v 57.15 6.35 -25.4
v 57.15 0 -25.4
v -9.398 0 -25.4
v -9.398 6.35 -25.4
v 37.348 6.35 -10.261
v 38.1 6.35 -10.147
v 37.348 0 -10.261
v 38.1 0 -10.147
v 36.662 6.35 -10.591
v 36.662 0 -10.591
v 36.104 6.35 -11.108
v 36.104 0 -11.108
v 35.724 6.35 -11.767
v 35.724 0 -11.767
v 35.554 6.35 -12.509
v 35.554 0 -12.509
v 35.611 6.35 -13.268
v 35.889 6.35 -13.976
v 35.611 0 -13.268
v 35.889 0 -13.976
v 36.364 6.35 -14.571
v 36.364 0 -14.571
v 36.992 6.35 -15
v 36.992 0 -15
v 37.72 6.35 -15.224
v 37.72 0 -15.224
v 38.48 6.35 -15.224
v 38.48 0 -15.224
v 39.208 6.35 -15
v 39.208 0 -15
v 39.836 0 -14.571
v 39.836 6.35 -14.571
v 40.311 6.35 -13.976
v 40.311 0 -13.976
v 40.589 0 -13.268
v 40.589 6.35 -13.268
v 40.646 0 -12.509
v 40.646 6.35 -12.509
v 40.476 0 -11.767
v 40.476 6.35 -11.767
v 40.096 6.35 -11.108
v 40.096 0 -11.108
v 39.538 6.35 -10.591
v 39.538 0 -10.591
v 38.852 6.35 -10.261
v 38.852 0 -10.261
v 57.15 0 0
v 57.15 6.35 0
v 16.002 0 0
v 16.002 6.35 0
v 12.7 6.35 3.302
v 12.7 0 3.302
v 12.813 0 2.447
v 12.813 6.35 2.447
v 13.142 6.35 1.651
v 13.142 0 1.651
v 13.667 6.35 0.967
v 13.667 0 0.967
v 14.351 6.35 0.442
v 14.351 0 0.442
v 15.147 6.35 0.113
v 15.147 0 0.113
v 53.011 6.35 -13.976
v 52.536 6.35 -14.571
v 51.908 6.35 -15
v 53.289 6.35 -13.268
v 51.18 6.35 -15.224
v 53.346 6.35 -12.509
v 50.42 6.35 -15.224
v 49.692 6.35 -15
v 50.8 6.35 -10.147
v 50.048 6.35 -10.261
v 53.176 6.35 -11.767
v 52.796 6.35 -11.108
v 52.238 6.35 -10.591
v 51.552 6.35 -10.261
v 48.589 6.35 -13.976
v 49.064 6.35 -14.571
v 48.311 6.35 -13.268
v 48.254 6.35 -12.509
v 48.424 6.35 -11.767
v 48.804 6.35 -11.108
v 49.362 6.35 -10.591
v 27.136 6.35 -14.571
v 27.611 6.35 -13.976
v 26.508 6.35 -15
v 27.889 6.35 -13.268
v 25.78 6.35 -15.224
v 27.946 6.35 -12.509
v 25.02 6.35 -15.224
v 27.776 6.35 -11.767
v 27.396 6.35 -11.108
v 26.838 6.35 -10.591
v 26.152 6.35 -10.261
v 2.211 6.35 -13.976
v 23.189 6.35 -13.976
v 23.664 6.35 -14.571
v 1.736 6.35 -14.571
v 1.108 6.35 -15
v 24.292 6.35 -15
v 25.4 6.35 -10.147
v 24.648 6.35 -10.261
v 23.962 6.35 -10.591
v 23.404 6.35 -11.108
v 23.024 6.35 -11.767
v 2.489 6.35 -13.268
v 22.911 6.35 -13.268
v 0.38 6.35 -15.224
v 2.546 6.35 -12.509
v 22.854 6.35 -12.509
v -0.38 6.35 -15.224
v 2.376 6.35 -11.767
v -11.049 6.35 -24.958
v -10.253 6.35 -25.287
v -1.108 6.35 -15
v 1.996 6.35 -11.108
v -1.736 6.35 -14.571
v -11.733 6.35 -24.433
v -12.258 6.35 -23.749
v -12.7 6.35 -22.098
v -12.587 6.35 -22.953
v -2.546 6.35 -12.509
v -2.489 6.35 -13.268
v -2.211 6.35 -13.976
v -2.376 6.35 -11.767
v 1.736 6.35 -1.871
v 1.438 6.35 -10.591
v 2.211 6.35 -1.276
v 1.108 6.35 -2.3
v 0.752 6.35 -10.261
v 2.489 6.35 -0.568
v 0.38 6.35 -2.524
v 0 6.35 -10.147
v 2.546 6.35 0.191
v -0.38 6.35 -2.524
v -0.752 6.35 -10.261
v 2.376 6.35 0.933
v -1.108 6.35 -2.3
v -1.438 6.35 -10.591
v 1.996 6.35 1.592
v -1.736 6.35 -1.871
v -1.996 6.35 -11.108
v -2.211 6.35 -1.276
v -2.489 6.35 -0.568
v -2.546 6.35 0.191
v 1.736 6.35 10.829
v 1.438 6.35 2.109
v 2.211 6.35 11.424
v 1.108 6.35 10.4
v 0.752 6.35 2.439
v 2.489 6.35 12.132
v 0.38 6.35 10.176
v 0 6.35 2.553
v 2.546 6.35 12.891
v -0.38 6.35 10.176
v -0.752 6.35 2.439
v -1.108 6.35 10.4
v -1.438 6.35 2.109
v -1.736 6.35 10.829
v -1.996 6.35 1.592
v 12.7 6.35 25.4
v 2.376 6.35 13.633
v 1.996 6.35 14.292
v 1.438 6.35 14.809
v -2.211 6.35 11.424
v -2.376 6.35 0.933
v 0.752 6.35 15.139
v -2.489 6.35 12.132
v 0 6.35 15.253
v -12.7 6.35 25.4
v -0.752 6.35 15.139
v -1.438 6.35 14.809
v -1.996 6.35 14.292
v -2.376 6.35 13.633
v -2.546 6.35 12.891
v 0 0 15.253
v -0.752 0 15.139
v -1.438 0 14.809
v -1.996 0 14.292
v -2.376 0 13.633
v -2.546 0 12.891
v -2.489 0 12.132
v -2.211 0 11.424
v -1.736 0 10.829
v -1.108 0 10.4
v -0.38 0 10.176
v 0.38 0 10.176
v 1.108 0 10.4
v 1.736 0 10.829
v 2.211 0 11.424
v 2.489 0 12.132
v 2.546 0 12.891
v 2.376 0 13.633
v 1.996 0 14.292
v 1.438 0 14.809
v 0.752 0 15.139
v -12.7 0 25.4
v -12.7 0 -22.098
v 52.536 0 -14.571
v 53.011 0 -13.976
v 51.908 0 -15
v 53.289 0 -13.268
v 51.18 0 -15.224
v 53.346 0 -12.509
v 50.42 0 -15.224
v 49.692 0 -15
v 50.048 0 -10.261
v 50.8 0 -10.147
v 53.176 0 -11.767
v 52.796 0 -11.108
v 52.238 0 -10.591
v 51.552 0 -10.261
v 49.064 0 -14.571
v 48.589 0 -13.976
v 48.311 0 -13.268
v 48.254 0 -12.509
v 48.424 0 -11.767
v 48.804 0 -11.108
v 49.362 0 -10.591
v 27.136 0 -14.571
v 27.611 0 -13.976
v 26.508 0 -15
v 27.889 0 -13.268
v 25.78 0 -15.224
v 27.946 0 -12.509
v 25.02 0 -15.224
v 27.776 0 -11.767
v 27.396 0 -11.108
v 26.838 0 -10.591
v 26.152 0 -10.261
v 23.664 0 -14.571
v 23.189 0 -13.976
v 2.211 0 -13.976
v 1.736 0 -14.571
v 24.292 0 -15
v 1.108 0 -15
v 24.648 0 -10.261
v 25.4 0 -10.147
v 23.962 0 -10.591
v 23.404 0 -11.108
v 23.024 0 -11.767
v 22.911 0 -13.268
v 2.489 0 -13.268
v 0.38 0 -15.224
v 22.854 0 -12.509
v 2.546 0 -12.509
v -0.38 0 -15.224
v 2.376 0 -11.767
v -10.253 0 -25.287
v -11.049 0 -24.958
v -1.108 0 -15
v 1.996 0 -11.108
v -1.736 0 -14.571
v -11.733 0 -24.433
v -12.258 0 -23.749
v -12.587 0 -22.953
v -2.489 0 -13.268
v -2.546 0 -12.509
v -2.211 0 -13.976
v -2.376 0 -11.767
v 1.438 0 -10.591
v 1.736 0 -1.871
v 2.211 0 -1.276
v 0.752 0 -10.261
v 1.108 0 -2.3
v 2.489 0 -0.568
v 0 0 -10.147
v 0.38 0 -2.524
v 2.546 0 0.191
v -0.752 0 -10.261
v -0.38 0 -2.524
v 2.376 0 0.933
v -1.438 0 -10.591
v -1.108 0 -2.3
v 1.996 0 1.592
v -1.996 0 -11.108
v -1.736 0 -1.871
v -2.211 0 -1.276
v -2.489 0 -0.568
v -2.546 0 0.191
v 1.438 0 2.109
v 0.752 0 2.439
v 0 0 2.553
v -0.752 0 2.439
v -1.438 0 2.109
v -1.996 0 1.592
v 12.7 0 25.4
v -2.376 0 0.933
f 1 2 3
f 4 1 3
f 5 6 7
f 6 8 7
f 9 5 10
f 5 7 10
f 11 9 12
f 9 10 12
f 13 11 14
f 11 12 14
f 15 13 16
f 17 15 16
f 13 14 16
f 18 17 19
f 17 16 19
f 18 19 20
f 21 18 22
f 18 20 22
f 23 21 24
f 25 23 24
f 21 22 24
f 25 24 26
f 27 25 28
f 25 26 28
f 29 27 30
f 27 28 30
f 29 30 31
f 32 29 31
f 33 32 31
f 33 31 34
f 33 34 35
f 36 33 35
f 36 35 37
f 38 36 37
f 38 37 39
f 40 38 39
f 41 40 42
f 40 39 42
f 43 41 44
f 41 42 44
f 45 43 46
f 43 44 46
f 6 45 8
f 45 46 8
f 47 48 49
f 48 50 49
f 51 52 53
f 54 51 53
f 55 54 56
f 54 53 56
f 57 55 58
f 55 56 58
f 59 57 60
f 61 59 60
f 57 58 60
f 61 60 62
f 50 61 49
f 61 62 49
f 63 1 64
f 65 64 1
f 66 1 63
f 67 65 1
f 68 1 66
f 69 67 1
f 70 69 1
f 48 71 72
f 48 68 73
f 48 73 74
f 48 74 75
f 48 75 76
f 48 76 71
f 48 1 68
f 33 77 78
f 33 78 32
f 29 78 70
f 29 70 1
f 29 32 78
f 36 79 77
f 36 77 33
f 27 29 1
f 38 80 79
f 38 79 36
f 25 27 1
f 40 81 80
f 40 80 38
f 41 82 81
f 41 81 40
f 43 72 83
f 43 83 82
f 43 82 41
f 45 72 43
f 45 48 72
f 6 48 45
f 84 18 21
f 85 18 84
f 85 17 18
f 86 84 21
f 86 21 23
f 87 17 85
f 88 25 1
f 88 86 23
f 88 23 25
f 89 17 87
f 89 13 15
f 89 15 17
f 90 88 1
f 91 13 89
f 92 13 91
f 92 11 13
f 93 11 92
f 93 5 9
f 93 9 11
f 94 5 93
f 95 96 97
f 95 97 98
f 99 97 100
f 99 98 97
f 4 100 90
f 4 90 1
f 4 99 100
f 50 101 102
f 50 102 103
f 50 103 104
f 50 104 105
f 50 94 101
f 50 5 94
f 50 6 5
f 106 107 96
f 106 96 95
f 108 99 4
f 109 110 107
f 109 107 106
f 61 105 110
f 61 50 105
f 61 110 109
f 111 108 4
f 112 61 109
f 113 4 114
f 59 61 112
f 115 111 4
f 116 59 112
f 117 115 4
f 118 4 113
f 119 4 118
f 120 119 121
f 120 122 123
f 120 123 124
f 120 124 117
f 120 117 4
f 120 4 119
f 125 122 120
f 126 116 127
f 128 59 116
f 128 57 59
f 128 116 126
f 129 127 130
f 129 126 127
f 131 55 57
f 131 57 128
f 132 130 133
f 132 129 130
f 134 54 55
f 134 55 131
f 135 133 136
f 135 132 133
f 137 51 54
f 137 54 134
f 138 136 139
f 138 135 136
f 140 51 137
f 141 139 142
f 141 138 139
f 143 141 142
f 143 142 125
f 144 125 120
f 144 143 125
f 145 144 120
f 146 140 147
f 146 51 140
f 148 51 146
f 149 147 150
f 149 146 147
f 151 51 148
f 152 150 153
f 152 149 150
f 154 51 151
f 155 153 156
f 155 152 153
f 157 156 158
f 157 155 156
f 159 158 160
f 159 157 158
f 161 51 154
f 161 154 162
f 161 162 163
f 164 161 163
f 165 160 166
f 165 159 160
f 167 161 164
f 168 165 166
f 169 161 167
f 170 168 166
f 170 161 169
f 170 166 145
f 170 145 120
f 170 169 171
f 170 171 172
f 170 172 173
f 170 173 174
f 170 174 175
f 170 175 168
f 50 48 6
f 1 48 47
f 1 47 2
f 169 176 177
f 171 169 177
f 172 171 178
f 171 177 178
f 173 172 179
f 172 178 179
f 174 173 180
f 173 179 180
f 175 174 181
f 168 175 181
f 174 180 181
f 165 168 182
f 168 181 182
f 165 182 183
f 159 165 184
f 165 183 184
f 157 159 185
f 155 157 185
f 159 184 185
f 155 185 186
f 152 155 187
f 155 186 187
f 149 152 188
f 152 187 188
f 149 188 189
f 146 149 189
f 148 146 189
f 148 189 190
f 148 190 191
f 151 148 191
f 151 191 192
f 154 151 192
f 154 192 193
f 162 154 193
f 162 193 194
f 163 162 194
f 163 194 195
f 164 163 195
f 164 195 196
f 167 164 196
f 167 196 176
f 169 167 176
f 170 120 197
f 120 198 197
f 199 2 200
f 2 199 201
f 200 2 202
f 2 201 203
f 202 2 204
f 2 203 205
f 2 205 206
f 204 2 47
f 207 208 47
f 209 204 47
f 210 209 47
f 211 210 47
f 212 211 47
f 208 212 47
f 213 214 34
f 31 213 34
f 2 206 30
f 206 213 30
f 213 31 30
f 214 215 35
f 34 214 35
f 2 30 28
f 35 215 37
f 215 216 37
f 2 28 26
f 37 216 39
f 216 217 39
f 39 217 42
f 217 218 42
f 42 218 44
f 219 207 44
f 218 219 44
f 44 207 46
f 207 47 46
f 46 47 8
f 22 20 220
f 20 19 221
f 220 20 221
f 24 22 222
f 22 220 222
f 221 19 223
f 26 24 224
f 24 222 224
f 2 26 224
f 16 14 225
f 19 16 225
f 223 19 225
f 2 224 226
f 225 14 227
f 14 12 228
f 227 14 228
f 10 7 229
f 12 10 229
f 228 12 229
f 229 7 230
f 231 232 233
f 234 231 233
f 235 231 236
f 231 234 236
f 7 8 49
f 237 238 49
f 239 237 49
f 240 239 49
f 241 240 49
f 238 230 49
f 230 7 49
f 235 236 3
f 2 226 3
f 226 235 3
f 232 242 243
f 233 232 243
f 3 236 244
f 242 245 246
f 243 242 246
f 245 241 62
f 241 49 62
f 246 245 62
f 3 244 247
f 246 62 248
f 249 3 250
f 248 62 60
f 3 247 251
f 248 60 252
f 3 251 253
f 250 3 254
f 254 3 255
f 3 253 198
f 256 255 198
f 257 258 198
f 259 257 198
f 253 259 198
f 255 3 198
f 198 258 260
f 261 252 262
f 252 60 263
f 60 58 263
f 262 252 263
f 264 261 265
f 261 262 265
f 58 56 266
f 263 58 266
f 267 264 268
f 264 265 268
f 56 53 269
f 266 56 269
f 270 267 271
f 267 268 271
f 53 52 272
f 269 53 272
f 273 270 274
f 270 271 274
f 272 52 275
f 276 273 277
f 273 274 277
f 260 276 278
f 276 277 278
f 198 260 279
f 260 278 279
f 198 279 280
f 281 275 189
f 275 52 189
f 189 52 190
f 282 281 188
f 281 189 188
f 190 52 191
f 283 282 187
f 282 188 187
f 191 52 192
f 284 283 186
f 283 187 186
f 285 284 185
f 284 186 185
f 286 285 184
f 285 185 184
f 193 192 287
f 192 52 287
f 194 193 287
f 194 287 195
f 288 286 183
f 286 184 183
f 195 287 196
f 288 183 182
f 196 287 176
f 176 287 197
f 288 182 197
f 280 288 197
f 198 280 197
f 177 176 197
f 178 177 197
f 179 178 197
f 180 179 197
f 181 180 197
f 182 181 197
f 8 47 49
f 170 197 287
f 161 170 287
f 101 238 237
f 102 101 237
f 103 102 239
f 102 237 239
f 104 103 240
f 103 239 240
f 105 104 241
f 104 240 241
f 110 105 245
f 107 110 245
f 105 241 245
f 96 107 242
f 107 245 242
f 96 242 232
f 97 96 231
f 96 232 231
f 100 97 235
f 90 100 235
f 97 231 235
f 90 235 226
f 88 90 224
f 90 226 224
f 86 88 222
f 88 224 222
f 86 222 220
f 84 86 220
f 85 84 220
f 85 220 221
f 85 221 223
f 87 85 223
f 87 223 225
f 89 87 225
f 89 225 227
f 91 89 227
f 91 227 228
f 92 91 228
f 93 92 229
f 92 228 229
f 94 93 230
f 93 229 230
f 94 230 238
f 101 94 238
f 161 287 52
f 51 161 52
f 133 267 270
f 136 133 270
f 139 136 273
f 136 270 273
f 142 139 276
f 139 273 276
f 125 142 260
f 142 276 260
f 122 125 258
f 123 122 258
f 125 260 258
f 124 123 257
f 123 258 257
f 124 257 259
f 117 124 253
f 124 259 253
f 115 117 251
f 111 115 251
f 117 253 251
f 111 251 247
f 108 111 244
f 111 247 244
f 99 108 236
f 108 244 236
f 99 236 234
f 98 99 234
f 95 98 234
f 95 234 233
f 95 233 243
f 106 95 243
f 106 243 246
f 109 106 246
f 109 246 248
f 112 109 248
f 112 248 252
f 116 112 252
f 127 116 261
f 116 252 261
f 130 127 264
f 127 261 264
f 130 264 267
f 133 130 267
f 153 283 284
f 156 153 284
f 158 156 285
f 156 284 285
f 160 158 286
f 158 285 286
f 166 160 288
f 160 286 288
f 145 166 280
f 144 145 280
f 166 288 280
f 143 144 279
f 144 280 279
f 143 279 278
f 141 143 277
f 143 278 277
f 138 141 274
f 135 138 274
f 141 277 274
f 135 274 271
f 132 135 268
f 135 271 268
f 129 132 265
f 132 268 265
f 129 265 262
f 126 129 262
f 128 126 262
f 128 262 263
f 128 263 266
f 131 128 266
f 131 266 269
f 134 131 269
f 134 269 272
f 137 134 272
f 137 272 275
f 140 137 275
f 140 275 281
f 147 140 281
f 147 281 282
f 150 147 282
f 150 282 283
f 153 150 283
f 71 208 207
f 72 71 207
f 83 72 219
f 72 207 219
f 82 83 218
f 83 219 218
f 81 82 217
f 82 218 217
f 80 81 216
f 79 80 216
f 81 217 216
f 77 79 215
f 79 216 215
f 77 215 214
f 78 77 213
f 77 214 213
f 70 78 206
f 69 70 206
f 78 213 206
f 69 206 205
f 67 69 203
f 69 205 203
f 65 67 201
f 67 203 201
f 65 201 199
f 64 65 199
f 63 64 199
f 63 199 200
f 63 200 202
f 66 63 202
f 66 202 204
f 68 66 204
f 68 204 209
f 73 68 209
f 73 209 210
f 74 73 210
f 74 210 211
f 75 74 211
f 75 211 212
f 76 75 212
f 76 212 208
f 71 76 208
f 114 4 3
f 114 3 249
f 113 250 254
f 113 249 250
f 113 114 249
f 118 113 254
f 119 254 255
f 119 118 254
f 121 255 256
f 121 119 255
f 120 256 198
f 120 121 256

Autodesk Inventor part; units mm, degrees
ref_plane "YZ Plane" through (0, 0, 0) normal (1, 0, 0) x (0, 1, 0)
ref_plane "XZ Plane" through (0, 0, 0) normal (0, 1, 0) x (-1, 0, 0)
ref_plane "XY Plane" through (0, 0, 0) normal (0, 0, 1) x (1, 0, 0)
sketch "Sketch1" plane through (0, 0, 0) normal (0, 1, 0) x (-1, 0, 0)
  line L0 (12.7, 25.4) -> (-12.7, 25.4)
  line L1 (-12.7, 25.4) -> (-12.7, -25.4)
  line L2 (-12.7, -25.4) -> (12.7, -25.4)
  line L3 (12.7, -25.4) -> (12.7, 25.4)
  line L4 (12.7, 25.4) -> (-12.7, -25.4) construction
  line L5 (-12.7, 25.4) -> (12.7, -25.4) construction
  point P0 (0, 0)
  dimension "d0" = 25.4
  dimension "d1" = 50.8
extrude "Extrusion1" add sketch "Sketch1" along normal blind 6.35
sketch "Sketch3" plane through (12.7, 0, 25.4) normal (1, 0, 0) x (0, 0, -1)
  line L0 (0, 6.35) -> (50.8, 6.35) projected
  line L1 (50.8, 6.35) -> (25.4, 6.35)
  line L2 (25.4, 6.35) -> (25.4, 0)
  line L3 (25.4, 0) -> (50.8, 0)
  line L4 (50.8, 0) -> (50.8, 6.35)
  dimension "d14" = 25.4
extrude "Extrusion2" add sketch "Sketch3" along normal blind 44.45
sketch "Sketch4" plane through (0, 6.35, 0) normal (0, 1, 0) x (1, 0, 0)
  line L0 (-12.7, -25.4) -> (12.7, -25.4) projected
  point P0 (0, 0)
  point P1 (0, -12.7)
  point P2 (0, 0)
  point P3 (0, 12.7)
  point P4 (0, -25.4)
  point P5 (0, -25.4)
  point P6 (0, -25.4)
  point P7 (25.4, 12.7)
  point P8 (38.1, 12.7)
  point P9 (50.8, 12.7)
  dimension "d17" = 12.7
  dimension "d18" = 12.7
  dimension "d19" = 12.7
  dimension "d20" = 25.4
  dimension "d21" = 12.7
  dimension "d22" = 12.7
hole "Hole2" at (0, 6.35, 12.7) at (0, 6.35, 0) at (0, 6.35, -12.7) at (25.4, 6.35, -12.7) at (38.1, 6.35, -12.7) at (50.8, 6.35, -12.7) direction (0, -1, 0) diameter 5.1054 end through all clearance for "Flat Head Machine Screw (82)" size "#10" standard "Ansi Unified Screw Threads"
fillet "Fillet1" radius 3.302 2 edges at (12.7, 3.175, 0) (-12.7, 3.175, -25.4)
properties part number "DB1-003" material "Aluminum 6061"
